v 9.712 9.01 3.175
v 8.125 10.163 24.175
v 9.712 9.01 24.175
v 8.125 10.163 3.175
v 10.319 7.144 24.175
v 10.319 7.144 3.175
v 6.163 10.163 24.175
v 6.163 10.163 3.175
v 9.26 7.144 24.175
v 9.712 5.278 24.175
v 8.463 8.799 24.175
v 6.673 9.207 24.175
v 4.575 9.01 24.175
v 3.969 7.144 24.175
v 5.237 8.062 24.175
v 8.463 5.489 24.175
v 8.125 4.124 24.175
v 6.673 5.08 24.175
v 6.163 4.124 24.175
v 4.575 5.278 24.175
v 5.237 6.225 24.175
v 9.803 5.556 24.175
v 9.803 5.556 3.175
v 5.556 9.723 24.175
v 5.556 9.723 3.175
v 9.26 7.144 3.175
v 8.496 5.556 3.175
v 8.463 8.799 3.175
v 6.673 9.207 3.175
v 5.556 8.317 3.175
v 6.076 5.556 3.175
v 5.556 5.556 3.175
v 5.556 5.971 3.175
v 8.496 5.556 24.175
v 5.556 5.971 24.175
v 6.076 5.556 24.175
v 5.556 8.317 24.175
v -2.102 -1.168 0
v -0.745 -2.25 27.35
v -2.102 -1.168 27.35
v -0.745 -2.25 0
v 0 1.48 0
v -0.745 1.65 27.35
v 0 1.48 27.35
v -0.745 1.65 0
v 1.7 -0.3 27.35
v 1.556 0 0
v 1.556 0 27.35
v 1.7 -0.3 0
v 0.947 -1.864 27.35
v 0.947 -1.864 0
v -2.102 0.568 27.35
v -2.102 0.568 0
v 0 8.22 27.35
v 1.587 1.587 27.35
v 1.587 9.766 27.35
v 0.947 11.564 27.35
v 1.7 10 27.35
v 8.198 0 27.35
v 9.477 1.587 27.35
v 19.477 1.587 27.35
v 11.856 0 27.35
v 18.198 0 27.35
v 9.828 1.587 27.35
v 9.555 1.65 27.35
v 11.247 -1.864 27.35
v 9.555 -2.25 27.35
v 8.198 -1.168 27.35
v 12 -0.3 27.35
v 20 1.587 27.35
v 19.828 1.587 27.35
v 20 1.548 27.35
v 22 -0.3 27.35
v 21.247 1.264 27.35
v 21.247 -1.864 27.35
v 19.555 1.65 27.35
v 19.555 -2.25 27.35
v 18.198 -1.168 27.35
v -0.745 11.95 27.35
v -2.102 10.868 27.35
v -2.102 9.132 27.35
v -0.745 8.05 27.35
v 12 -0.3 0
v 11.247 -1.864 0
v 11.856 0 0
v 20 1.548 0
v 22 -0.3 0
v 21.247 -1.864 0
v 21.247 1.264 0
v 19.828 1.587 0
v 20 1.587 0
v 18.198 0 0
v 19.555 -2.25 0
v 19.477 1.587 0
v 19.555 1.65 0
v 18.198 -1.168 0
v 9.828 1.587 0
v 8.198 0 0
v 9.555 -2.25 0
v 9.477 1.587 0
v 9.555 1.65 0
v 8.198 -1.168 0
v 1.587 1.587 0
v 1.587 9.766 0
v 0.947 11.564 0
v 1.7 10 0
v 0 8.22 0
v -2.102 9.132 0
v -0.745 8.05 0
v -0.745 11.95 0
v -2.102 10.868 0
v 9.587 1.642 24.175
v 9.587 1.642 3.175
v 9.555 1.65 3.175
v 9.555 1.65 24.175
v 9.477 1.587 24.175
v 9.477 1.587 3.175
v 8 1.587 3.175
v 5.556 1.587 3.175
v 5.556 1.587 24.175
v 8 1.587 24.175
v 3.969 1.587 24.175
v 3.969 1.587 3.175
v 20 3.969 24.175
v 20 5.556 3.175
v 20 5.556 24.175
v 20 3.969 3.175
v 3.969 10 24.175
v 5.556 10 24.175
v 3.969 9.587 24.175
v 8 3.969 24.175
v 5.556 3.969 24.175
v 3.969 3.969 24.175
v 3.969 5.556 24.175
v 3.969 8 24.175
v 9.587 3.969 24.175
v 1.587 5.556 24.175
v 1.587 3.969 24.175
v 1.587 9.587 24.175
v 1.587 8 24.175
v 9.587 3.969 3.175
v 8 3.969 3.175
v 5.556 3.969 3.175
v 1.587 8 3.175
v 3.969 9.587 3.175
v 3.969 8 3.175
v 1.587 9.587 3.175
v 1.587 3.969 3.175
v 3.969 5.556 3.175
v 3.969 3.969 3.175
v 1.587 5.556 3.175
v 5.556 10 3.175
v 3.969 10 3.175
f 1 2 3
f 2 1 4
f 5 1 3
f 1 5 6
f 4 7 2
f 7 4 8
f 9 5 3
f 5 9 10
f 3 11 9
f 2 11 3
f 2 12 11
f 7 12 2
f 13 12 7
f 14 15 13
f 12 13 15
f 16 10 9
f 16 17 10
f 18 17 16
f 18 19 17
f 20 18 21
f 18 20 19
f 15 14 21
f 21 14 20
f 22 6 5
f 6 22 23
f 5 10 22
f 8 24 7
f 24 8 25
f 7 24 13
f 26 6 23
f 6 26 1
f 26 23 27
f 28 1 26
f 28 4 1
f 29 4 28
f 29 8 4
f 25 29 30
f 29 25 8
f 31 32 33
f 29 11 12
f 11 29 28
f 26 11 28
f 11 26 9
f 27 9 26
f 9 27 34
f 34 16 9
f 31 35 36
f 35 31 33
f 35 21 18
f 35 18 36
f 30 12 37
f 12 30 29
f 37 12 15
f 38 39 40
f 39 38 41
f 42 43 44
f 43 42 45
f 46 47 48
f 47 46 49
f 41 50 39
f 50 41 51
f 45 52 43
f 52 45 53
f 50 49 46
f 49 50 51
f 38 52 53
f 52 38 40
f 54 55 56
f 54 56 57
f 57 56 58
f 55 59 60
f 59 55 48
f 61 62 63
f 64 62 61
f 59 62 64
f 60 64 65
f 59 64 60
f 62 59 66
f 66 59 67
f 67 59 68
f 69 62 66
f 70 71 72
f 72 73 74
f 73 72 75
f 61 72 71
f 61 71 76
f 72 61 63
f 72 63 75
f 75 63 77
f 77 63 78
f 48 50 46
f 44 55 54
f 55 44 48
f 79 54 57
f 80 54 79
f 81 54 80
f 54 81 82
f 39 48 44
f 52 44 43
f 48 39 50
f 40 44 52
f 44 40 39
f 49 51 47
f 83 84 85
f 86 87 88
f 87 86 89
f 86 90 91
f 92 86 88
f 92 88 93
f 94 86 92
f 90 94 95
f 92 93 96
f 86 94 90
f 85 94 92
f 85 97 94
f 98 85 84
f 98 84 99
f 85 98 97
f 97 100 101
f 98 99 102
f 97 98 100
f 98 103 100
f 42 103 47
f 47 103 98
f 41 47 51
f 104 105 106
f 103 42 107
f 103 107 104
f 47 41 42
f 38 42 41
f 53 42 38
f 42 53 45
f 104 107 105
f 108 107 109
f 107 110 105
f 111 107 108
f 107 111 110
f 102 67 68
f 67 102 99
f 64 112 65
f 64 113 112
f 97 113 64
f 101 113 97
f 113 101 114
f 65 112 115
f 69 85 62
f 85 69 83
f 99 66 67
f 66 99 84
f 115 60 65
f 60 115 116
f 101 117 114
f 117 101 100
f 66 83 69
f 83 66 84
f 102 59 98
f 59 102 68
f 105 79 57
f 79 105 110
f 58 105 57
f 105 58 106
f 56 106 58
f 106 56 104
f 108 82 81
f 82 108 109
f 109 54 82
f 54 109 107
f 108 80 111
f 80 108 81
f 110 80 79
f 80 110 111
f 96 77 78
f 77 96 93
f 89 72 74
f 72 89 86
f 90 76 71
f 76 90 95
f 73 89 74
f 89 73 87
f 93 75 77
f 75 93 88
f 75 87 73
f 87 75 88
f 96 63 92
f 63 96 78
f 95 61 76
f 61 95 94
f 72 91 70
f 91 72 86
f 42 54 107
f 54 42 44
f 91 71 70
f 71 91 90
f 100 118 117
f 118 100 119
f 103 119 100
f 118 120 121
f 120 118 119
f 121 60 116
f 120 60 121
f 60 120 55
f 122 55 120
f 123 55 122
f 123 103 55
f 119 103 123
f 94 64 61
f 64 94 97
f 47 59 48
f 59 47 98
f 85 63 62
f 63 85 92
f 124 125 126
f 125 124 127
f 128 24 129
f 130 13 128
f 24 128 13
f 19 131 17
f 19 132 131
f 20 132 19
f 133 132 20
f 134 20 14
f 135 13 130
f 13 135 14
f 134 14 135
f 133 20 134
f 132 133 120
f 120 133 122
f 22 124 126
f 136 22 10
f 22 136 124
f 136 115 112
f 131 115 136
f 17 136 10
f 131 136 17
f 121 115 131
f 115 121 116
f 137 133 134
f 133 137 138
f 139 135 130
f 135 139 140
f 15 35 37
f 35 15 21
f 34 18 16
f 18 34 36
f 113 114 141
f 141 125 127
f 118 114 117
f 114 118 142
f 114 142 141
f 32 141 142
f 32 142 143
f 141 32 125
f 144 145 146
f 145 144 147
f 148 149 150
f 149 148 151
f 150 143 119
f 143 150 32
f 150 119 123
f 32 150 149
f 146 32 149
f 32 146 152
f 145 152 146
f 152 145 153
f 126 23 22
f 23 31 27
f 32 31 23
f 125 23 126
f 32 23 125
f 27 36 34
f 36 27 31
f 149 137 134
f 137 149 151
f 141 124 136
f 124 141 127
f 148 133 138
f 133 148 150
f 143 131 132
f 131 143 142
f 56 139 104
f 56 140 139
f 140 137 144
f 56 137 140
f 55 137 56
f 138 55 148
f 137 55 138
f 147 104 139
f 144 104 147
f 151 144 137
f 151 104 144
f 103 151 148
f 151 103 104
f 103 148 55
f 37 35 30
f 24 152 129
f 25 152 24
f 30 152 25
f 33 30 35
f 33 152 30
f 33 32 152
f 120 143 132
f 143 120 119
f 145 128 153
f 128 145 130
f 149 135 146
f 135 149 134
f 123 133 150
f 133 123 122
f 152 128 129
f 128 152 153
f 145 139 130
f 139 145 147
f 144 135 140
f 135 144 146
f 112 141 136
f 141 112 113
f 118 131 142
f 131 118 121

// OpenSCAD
// file: v2/end.scad
/**
 * ends.scad is part of Paper Laptop project.
 *
 * @author R. S. Doiel, <rsdoiel@gmail.com>
 * copyright (c) 2016 all rights reserved
 * Released under a BSD 2-clause license
 */

/*
# misc notes

|  Inches   | Inches    |  Millimeters |
|(fraction) | (decimal) |              |
+-----------+-----------+--------------+
|    1/16   |    0.0625 | 1.5875       |
|    1/8    |    0.125  | 3.175        |
|    3/16   |    0.1875 | 4.7625       |
|    1/4    |    0.25   | 6.35         |
|    3/8    |    0.375  | 9.525        |
|    1/2    |    0.5    | 12.7         |
|    5/8    |    0.625  | 15.875       |
|    3/4    |    0.75   | 19.05        |
|    7/8    |    0.875  | 22.225       |
|    1      |    1.0    | 25.4         |

## Raspberry Pi Dimensions

85.60mm x 56mm x 21mm
(or roughly 3.37″ x 2.21″ x 0.83″)

 */

 /*
  * End: internal ends to allow cables, cords or other access through a side
  */
module End() {
    // sizing and spacing
    t = 3.175;// Aprox. 1/8 inch.
    side_t = t/2;
    side_l = 20;
    b_spacing = side_l/2;
    inner_h = 21;
    inner_t = t*1.25;
    outer_t = side_t;
    outer_h = inner_h+(2*t);
    bump_r = 2;
    bump_o = -0.3;

    // main fastening surface
    translate([t*2.25, t*2.25, t]) {
        difference() {
            // fastener body
            color([1,0,0]) cylinder(h=inner_h, r=t, center=false);
            // bolt hole
            color([0,0,0]) cylinder(h=inner_h, r=t/1.5, center=false);
        }
    }

    // corner bumper
    translate([bump_o, bump_o, 0]) {
        color([1,0,0]) cylinder(h=outer_h, r=bump_r, center=false);
    }

    // middle bumpers side a
    translate([b_spacing, bump_o, 0]) {
        color([1,0,0]) cylinder(h=outer_h, r=bump_r, center=false);
    }

    // middle bumpers side b
    translate([bump_o, b_spacing, 0]) {
        color([1,0,0]) cylinder(h=outer_h, r=bump_r, center=false);
    }

    // end bumpers
    translate([side_l, bump_o, 0]) {
        color([1,0,0]) cylinder(h=outer_h, r=bump_r, center=false);
    }
    /*
    translate([bump_o, side_l, 0]) {
        color([1,0,0]) cylinder(h=outer_h, r=bump_r, center=false);
    }
    */

    // outer side a
    translate([0, 0, 0]) {
       color([0,1,0]) cube([side_l, side_t, outer_h], center=false);
    }

    // Inner side a
    translate([0, t*1.25, t]) {
       color([0,1,0]) cube([side_l, side_t, inner_h], center=false);
    }

    // outer side b
    translate([0, 0, 0]) {
       color([0,1,0]) cube([side_t, side_l/2, outer_h], center=false);
    }

    // Inner side b
    translate([t*1.25, 0, t]) {
       color([0,1,0]) cube([side_t, side_l/2, inner_h], center=false);
    }

    // filler corner
    translate([1, 8, t]) {
       color([0,0, 1]) cube([inner_t, outer_t, inner_h], center=false);
    }
    translate([8, 1, t]) {
       color([0,0, 1]) cube([outer_t, inner_t, inner_h], center=false);
    }
}
// main file
/**
 * test-end.scad is part of Paper Laptop project.
 *
 * @author R. S. Doiel, <rsdoiel@gmail.com>
 * copyright (c) 2016 all rights reserved
 * Released under a BSD 2-clause license
 */
include <v2/end.scad>

End();
